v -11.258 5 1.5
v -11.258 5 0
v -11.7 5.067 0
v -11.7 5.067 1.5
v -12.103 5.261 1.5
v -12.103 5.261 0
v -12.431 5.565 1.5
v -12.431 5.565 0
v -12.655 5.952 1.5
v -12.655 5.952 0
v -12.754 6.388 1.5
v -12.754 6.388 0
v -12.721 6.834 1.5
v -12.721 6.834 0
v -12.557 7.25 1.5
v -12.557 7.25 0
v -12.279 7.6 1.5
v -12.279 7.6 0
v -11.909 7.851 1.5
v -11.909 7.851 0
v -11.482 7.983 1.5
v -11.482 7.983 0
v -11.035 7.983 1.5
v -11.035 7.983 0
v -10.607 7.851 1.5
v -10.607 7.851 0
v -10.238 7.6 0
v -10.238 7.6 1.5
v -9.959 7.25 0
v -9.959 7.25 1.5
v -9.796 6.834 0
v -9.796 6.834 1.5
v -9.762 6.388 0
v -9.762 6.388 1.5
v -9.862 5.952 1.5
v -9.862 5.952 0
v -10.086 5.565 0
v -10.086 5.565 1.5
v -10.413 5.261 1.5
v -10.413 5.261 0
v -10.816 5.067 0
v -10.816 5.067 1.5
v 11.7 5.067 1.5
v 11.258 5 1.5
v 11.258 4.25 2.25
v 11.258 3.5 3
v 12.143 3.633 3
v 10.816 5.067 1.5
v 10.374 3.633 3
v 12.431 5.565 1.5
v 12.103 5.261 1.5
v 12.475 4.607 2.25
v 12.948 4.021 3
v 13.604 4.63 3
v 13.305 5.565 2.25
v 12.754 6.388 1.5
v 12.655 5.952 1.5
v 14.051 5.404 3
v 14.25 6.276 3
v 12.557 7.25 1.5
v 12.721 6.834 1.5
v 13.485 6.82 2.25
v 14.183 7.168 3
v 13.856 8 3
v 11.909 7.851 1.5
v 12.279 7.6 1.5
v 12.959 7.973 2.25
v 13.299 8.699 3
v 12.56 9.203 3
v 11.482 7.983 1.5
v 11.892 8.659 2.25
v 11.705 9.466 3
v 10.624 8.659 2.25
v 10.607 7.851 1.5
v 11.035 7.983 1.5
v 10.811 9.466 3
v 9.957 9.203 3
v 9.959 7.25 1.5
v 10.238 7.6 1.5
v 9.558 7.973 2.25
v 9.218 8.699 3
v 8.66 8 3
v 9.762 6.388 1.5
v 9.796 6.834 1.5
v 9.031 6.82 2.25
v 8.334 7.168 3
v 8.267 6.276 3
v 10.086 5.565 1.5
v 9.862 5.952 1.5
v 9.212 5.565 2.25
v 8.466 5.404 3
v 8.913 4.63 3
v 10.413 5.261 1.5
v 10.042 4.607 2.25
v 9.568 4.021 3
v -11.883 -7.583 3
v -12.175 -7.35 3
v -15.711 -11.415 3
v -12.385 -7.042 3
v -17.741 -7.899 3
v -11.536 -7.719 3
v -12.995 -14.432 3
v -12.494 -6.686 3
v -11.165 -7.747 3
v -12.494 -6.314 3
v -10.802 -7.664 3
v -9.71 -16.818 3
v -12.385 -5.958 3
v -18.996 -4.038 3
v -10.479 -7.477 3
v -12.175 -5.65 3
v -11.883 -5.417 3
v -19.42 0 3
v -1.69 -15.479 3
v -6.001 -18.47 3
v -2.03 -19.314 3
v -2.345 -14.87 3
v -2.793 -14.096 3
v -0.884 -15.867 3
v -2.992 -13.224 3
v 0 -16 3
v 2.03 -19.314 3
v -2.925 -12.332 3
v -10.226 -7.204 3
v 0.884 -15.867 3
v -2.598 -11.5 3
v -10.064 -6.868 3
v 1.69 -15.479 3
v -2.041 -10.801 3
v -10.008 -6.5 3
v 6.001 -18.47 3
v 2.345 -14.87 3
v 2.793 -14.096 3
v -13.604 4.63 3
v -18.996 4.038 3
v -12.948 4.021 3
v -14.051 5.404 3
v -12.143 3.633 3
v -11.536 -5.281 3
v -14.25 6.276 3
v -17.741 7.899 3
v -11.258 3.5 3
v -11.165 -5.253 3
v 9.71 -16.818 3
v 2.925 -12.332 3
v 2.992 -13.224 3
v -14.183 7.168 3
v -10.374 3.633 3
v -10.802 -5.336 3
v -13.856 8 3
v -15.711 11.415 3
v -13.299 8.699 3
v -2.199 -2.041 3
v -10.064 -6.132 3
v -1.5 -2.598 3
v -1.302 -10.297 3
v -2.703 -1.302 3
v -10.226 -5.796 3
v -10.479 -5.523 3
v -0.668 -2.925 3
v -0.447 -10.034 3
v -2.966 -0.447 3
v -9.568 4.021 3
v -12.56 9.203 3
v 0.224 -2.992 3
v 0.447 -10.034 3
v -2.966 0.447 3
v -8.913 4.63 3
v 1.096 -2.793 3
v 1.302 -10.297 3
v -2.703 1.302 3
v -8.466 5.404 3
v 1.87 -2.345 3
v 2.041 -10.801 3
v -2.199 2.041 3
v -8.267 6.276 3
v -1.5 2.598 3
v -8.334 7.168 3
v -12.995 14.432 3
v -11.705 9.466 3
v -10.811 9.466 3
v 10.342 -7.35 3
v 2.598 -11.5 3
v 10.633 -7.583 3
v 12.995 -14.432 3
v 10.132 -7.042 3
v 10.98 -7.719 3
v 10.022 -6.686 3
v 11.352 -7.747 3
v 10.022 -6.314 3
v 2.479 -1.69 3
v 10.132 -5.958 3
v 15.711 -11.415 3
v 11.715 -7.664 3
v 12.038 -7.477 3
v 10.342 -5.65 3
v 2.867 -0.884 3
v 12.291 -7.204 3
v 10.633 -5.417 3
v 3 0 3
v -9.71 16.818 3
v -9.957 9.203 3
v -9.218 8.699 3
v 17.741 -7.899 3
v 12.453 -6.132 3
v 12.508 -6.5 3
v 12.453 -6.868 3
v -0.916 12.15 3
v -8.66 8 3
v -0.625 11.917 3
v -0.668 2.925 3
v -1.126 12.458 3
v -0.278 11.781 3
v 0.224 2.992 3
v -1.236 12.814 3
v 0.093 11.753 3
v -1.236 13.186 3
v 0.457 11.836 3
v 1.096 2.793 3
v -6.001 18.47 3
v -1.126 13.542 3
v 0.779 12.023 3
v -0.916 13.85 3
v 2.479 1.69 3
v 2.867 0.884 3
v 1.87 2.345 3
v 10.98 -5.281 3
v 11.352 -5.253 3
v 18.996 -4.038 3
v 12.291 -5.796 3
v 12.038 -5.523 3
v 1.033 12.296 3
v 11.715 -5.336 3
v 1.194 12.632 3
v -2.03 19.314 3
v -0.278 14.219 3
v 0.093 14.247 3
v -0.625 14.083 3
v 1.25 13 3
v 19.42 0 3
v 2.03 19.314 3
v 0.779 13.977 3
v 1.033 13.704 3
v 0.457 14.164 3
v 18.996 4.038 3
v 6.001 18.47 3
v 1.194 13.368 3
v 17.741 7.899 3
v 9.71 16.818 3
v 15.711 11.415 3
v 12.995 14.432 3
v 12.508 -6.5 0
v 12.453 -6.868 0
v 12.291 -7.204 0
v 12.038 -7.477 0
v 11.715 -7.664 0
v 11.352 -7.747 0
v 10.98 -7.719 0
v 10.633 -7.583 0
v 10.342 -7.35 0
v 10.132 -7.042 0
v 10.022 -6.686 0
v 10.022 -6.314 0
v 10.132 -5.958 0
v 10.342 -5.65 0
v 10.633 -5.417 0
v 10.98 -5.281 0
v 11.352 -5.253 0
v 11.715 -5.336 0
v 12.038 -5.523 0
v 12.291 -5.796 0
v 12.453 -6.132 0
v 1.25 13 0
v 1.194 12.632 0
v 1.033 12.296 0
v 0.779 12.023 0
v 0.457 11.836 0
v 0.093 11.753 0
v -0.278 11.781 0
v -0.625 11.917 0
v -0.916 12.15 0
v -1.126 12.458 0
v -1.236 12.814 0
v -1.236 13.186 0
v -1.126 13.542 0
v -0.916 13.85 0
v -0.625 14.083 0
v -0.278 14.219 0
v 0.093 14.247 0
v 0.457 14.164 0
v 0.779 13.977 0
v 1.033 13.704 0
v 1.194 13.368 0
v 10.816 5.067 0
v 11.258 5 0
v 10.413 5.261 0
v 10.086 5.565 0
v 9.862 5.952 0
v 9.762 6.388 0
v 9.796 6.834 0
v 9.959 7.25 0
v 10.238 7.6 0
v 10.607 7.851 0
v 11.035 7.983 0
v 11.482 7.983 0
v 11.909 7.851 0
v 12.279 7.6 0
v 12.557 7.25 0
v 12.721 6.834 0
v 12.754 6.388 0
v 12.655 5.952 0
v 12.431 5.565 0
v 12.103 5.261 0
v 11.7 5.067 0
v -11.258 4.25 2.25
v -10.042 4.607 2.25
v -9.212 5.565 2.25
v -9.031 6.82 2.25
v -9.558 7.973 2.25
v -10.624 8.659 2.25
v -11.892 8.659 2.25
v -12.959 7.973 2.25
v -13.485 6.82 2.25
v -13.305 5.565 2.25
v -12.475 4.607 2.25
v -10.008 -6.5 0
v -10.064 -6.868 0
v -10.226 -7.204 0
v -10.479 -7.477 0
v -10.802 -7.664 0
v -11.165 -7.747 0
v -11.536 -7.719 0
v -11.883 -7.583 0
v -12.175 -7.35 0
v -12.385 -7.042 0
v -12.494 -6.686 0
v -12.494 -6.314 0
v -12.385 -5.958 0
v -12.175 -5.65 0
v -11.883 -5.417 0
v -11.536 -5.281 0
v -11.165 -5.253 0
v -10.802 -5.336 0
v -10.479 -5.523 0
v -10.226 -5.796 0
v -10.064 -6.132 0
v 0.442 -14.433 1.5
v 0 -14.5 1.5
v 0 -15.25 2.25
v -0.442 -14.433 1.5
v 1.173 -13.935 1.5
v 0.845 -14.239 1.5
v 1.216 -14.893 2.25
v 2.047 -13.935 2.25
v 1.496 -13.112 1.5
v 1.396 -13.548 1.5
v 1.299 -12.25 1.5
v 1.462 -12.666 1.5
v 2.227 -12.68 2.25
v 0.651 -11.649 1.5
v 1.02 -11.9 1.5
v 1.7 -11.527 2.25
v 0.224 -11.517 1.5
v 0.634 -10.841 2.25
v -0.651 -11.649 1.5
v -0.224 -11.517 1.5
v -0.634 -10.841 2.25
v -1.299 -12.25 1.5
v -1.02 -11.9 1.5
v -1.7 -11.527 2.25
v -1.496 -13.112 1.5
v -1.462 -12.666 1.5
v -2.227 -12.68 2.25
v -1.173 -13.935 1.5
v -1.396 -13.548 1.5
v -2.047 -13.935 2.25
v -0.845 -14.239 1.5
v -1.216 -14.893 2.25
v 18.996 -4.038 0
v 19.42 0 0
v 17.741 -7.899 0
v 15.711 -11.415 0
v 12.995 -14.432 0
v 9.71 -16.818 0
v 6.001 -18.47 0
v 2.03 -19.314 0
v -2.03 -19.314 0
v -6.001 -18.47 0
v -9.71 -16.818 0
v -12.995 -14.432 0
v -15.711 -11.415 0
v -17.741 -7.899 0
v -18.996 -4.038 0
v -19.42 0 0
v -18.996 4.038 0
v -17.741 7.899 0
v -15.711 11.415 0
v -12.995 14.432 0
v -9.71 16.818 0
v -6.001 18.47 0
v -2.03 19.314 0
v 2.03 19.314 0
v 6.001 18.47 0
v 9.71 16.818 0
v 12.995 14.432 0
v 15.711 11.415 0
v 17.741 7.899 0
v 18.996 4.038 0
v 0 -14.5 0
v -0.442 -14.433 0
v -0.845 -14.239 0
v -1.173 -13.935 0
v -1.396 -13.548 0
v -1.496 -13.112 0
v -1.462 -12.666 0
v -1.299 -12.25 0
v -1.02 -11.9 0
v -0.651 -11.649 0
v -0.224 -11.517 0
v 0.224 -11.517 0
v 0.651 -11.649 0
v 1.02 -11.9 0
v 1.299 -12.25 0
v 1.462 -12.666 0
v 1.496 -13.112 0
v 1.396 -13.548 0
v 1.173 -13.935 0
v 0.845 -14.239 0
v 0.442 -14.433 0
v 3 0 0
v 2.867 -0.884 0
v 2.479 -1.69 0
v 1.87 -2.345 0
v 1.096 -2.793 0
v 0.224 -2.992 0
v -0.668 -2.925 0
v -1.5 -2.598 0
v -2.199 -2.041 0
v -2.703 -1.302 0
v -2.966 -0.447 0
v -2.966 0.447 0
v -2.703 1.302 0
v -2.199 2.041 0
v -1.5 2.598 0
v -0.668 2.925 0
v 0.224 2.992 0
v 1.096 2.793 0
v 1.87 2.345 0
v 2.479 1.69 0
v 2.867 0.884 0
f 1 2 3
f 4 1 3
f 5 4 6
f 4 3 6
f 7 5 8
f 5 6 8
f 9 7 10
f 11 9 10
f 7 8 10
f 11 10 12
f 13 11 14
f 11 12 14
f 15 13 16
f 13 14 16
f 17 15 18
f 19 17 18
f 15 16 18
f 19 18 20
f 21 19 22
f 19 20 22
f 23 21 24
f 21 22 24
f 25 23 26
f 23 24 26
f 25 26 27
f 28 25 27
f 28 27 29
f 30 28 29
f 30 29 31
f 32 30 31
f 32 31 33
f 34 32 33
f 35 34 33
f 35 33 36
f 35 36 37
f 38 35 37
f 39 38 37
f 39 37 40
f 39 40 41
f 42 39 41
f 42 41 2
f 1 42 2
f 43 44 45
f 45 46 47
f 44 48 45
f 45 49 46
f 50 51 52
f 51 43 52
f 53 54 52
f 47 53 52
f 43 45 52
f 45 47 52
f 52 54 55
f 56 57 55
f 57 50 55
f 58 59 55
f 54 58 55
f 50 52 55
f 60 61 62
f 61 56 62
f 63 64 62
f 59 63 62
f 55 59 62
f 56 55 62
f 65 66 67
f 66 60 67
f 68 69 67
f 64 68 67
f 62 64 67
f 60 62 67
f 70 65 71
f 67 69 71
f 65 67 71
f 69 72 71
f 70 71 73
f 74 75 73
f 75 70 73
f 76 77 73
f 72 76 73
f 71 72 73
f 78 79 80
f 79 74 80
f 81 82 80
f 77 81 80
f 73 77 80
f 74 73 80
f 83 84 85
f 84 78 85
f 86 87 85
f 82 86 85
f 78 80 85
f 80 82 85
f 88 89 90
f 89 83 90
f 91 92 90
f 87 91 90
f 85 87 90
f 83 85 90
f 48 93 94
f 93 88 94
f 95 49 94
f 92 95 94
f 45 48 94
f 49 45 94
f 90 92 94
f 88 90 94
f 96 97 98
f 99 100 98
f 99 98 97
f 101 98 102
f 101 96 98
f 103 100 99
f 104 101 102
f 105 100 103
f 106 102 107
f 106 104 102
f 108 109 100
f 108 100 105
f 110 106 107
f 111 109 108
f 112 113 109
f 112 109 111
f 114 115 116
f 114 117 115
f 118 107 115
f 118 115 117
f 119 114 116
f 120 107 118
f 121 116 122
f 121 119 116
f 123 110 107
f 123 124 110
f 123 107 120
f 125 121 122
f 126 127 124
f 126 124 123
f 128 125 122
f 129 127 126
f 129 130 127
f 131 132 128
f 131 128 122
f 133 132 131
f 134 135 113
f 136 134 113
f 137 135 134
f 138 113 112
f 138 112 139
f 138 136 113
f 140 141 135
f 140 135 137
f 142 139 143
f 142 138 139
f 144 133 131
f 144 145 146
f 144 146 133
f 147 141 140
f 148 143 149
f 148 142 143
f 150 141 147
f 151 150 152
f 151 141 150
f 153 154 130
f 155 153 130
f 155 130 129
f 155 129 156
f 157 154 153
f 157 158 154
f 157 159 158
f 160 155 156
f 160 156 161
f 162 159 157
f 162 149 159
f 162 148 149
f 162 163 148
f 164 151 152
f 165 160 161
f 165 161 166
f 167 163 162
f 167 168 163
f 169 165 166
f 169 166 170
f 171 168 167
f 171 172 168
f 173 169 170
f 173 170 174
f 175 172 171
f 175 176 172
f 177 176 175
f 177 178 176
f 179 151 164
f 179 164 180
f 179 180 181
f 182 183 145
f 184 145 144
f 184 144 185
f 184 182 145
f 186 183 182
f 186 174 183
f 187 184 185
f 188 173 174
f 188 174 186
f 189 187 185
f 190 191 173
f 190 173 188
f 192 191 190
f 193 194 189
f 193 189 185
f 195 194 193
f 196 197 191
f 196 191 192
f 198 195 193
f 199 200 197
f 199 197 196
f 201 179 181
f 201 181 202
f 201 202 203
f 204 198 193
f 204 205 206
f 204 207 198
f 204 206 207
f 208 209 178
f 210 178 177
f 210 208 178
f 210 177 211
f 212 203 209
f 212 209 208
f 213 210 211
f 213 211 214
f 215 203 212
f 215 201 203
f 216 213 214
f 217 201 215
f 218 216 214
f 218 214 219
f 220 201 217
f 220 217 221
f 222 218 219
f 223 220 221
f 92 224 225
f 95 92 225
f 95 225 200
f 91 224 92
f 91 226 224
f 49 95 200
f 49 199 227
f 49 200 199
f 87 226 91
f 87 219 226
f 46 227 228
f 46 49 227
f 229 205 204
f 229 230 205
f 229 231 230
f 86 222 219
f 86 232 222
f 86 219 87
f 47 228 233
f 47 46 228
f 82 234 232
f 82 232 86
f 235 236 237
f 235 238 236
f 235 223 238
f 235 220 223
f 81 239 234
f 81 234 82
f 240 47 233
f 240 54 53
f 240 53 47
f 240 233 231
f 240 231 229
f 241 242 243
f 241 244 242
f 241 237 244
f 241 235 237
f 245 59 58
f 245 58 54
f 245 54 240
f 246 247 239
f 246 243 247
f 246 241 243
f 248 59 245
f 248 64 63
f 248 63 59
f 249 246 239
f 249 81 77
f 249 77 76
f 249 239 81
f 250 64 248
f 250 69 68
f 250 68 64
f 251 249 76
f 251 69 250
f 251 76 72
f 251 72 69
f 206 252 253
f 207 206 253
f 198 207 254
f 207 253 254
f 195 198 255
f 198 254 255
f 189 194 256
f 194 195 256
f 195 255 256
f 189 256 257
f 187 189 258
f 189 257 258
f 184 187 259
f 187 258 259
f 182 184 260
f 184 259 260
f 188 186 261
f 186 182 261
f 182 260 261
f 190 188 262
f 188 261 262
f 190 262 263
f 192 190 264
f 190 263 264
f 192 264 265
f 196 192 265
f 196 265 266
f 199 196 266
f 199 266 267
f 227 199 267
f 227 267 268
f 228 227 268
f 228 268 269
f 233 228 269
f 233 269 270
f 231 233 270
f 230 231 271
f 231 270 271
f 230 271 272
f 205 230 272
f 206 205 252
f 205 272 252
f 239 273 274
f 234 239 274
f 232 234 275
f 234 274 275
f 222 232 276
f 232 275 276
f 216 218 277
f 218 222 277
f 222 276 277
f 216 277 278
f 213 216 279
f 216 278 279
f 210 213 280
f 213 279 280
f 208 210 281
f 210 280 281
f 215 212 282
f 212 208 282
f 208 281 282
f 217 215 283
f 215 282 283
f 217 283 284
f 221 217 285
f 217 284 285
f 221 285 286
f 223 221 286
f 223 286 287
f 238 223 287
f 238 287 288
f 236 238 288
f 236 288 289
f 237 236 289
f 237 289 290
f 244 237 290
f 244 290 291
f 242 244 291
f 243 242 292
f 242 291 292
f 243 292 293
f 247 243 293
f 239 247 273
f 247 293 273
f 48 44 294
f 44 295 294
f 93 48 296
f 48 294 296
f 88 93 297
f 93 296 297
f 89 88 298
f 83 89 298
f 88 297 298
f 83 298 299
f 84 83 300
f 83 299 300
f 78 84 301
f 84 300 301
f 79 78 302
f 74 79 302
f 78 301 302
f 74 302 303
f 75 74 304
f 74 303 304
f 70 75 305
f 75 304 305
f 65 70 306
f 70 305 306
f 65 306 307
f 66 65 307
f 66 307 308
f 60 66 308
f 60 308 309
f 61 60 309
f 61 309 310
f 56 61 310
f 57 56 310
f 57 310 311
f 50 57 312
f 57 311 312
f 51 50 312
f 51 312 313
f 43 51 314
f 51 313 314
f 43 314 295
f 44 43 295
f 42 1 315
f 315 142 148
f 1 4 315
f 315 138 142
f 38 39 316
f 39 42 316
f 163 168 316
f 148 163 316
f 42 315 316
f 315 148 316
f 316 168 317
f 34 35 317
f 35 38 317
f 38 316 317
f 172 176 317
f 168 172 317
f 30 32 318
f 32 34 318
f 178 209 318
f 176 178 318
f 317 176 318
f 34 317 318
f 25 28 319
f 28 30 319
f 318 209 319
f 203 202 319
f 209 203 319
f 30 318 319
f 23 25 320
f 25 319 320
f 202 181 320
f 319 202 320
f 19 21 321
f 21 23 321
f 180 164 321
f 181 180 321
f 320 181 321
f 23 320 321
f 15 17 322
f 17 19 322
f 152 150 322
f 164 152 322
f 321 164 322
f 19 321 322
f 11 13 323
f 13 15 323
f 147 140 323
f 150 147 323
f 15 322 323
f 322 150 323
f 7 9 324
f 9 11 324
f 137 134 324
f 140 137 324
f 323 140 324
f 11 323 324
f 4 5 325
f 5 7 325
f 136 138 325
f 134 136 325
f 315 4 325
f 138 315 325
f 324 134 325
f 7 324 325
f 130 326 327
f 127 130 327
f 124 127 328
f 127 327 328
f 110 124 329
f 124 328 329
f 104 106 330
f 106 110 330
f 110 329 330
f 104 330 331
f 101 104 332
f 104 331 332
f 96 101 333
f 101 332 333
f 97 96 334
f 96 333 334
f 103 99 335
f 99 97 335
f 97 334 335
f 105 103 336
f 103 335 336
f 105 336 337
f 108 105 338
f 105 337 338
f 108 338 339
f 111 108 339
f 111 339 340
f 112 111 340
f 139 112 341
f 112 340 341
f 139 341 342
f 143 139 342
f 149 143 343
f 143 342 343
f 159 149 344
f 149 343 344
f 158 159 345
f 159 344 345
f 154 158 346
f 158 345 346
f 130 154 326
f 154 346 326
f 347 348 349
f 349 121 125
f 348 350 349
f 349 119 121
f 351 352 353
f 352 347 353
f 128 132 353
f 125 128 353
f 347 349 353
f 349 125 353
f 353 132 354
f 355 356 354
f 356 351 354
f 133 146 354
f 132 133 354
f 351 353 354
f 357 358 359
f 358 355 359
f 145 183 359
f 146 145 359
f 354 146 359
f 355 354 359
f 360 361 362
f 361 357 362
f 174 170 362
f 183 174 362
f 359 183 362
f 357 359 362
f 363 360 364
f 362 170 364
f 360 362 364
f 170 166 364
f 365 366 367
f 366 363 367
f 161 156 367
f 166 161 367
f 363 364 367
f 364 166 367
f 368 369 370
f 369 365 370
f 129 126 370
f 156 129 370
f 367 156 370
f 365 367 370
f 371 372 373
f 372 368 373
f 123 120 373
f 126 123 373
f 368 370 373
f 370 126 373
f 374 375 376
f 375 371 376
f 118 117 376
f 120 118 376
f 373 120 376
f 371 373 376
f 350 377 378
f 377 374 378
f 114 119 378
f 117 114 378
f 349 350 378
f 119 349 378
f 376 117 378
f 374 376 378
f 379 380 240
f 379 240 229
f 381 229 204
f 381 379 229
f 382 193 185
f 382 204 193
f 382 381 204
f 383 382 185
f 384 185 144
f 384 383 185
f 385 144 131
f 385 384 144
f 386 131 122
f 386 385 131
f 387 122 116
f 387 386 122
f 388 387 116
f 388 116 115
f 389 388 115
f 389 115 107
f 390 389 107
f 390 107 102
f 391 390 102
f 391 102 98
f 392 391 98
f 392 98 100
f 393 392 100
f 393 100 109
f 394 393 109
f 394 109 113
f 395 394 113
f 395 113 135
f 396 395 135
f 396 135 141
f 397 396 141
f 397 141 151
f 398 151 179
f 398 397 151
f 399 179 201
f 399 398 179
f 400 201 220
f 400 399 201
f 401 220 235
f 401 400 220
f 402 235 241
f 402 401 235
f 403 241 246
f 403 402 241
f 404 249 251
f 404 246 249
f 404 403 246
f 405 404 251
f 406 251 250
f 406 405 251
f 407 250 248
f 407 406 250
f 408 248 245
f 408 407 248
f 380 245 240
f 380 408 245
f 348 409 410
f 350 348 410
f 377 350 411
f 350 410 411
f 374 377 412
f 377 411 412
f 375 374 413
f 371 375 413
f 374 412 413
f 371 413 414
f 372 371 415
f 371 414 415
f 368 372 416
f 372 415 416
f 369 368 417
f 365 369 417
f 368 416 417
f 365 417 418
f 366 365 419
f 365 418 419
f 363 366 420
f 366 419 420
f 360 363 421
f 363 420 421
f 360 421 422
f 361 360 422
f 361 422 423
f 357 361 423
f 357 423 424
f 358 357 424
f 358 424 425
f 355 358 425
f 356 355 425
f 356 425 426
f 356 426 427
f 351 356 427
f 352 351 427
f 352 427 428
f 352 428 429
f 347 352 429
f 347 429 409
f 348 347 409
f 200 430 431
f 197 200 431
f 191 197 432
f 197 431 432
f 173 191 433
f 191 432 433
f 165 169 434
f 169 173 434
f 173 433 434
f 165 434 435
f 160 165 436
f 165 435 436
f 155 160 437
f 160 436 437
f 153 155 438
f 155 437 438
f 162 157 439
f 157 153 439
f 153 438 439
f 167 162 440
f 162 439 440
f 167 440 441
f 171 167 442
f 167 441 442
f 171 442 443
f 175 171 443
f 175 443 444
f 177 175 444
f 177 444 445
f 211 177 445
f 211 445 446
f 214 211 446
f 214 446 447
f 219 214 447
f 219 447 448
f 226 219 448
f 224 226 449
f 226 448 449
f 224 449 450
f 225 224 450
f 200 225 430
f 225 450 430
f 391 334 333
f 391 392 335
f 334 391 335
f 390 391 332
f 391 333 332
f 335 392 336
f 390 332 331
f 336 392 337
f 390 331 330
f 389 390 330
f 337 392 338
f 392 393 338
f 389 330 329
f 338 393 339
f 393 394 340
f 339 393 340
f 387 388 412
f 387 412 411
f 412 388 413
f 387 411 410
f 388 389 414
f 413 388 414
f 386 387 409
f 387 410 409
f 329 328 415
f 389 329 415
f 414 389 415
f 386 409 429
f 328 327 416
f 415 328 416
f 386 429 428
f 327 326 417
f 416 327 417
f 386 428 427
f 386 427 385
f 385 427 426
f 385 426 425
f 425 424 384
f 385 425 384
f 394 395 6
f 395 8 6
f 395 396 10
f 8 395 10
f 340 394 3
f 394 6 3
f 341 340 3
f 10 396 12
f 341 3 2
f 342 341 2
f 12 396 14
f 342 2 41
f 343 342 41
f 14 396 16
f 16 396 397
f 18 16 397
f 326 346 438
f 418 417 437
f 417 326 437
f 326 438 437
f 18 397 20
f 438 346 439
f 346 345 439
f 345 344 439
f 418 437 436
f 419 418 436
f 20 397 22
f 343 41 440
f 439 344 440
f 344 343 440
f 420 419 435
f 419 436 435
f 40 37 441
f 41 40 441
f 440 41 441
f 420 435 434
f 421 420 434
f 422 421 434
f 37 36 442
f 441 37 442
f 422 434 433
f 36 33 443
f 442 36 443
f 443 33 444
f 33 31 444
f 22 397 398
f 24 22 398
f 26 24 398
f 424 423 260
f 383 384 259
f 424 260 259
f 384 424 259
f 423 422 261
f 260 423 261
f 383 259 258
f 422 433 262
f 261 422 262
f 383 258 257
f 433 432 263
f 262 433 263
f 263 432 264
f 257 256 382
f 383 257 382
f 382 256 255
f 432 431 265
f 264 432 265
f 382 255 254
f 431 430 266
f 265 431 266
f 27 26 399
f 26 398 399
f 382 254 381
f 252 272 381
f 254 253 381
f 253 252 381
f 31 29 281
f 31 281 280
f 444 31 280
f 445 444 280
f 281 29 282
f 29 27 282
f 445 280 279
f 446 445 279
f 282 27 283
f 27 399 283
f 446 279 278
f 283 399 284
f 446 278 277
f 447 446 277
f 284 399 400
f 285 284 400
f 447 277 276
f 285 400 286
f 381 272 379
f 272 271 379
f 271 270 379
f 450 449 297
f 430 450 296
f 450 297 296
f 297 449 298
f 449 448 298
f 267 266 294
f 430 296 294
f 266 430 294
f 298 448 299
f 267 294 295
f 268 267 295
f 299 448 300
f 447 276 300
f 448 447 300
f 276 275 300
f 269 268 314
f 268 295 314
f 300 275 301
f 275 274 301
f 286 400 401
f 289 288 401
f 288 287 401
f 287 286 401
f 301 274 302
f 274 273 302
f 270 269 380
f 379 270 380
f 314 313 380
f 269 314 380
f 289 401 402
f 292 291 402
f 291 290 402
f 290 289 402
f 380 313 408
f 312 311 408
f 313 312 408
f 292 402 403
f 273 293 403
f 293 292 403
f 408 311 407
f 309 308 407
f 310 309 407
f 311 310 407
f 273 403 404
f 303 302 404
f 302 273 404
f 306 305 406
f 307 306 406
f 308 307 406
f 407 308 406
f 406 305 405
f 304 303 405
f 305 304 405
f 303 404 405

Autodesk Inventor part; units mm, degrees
ref_plane "YZ Plane" through (0, 0, 0) normal (1, 0, 0) x (0, 1, 0)
ref_plane "XZ Plane" through (0, 0, 0) normal (0, 1, 0) x (-1, 0, 0)
ref_plane "XY Plane" through (0, 0, 0) normal (0, 0, 1) x (1, 0, 0)
sketch "Skizze1" plane through (0, 0, 0) normal (0, 0, 1) x (1, 0, 0)
  circle A0 centre (0, 13) radius 1.25 projected
  circle A1 centre (0, -13) radius 1.25 projected
  circle A2 centre (11.2583, 6.5) radius 1.25 projected
  circle A3 centre (11.2583, -6.5) radius 1.25 projected
  circle A4 centre (-11.2583, 6.5) radius 1.25 projected
  circle A5 centre (-11.2583, -6.5) radius 1.25 projected
  arc A6 (-8.7265, -12.2003) -> (-6.2025, -13.6575) centre (0, 0) ccw projected
  arc A7 (-8.9067, -9.0923) -> (-8.7265, -12.2003) centre (-7.563, -10.5736) ccw projected
  arc A8 (-8.9067, -9.0923) -> (-12.3275, -3.1673) centre (-11.2583, -6.5) ccw projected
  arc A9 (-14.929, -1.4572) -> (-12.3275, -3.1673) centre (-12.9385, -1.2629) ccw projected
  arc A10 (-14.929, 1.4572) -> (-14.929, -1.4572) centre (0, 0) ccw projected
  arc A11 (-12.3275, 3.1673) -> (-14.929, 1.4572) centre (-12.9385, 1.2629) ccw projected
  arc A12 (-12.3275, 3.1673) -> (-8.9067, 9.0923) centre (-11.2583, 6.5) ccw projected
  arc A13 (-8.7265, 12.2003) -> (-8.9067, 9.0923) centre (-7.563, 10.5736) ccw projected
  arc A14 (-6.2025, 13.6575) -> (-8.7265, 12.2003) centre (0, 0) ccw projected
  arc A15 (-3.4208, 12.2596) -> (-6.2025, 13.6575) centre (-5.3755, 11.8365) ccw projected
  arc A16 (-3.4208, 12.2596) -> (3.4208, 12.2596) centre (0, 13) ccw projected
  arc A17 (6.2025, 13.6575) -> (3.4208, 12.2596) centre (5.3755, 11.8365) ccw projected
  arc A18 (8.7265, 12.2003) -> (6.2025, 13.6575) centre (0, 0) ccw projected
  arc A19 (8.9067, 9.0923) -> (8.7265, 12.2003) centre (7.563, 10.5736) ccw projected
  arc A20 (8.9067, 9.0923) -> (12.3275, 3.1673) centre (11.2583, 6.5) ccw projected
  arc A21 (14.929, 1.4572) -> (12.3275, 3.1673) centre (12.9385, 1.2629) ccw projected
  arc A22 (14.929, -1.4572) -> (14.929, 1.4572) centre (0, 0) ccw projected
  arc A23 (12.3275, -3.1673) -> (14.929, -1.4572) centre (12.9385, -1.2629) ccw projected
  arc A24 (12.3275, -3.1673) -> (8.9067, -9.0923) centre (11.2583, -6.5) ccw projected
  arc A25 (8.7265, -12.2003) -> (8.9067, -9.0923) centre (7.563, -10.5736) ccw projected
  arc A26 (6.2025, -13.6575) -> (8.7265, -12.2003) centre (0, 0) ccw projected
  arc A27 (3.4208, -12.2596) -> (6.2025, -13.6575) centre (5.3755, -11.8365) ccw projected
  arc A28 (3.4208, -12.2596) -> (-3.4208, -12.2596) centre (0, -13) ccw projected
  arc A29 (-6.2025, -13.6575) -> (-3.4208, -12.2596) centre (-5.3755, -11.8365) ccw projected
  circle A30 centre (0, 0) radius 17.5 projected
  circle A31 centre (0, 0) radius 19.42 projected
  circle A32 centre (0, 0) radius 3
  point P0 (0, 0)
  dimension "d0" = 6
extrude "Extrusion1" add sketch "Skizze1" along normal blind 3 contours A7 A8 A9 A10 A11 A12 A13 A14 A15 A16 A17 A18 A19 A20 A21 A22 A23 A24 A25 A26 A27 A28 A29 A6 | A30 | A31
sketch "Skizze2" plane through (0, 0, 3) normal (0, 0, 1) x (1, 0, 0)
  circle A0 centre (0, 0) radius 3 projected
  circle A1 centre (-11.2583, -6.5) radius 1.25 projected
  circle A2 centre (-11.2583, 6.5) radius 1.25 projected
  circle A3 centre (11.2583, -6.5) radius 1.25 projected
  circle A4 centre (11.2583, 6.5) radius 1.25 projected
  circle A5 centre (0, -13) radius 1.25 projected
  circle A6 centre (0, 13) radius 1.25 projected
  circle A7 centre (0, 0) radius 19.42 projected
  point P0 (0, 0)
hole "Bohrung1" at (-11.2583, 6.5, 3) at (0, -13, 3) at (11.2583, 6.5, 3) direction (0, 0, -1) diameter 3 end through all countersink diameter 6 countersink angle 90
properties part number "GripperMountCover" material "ABS-Kunststoff"
